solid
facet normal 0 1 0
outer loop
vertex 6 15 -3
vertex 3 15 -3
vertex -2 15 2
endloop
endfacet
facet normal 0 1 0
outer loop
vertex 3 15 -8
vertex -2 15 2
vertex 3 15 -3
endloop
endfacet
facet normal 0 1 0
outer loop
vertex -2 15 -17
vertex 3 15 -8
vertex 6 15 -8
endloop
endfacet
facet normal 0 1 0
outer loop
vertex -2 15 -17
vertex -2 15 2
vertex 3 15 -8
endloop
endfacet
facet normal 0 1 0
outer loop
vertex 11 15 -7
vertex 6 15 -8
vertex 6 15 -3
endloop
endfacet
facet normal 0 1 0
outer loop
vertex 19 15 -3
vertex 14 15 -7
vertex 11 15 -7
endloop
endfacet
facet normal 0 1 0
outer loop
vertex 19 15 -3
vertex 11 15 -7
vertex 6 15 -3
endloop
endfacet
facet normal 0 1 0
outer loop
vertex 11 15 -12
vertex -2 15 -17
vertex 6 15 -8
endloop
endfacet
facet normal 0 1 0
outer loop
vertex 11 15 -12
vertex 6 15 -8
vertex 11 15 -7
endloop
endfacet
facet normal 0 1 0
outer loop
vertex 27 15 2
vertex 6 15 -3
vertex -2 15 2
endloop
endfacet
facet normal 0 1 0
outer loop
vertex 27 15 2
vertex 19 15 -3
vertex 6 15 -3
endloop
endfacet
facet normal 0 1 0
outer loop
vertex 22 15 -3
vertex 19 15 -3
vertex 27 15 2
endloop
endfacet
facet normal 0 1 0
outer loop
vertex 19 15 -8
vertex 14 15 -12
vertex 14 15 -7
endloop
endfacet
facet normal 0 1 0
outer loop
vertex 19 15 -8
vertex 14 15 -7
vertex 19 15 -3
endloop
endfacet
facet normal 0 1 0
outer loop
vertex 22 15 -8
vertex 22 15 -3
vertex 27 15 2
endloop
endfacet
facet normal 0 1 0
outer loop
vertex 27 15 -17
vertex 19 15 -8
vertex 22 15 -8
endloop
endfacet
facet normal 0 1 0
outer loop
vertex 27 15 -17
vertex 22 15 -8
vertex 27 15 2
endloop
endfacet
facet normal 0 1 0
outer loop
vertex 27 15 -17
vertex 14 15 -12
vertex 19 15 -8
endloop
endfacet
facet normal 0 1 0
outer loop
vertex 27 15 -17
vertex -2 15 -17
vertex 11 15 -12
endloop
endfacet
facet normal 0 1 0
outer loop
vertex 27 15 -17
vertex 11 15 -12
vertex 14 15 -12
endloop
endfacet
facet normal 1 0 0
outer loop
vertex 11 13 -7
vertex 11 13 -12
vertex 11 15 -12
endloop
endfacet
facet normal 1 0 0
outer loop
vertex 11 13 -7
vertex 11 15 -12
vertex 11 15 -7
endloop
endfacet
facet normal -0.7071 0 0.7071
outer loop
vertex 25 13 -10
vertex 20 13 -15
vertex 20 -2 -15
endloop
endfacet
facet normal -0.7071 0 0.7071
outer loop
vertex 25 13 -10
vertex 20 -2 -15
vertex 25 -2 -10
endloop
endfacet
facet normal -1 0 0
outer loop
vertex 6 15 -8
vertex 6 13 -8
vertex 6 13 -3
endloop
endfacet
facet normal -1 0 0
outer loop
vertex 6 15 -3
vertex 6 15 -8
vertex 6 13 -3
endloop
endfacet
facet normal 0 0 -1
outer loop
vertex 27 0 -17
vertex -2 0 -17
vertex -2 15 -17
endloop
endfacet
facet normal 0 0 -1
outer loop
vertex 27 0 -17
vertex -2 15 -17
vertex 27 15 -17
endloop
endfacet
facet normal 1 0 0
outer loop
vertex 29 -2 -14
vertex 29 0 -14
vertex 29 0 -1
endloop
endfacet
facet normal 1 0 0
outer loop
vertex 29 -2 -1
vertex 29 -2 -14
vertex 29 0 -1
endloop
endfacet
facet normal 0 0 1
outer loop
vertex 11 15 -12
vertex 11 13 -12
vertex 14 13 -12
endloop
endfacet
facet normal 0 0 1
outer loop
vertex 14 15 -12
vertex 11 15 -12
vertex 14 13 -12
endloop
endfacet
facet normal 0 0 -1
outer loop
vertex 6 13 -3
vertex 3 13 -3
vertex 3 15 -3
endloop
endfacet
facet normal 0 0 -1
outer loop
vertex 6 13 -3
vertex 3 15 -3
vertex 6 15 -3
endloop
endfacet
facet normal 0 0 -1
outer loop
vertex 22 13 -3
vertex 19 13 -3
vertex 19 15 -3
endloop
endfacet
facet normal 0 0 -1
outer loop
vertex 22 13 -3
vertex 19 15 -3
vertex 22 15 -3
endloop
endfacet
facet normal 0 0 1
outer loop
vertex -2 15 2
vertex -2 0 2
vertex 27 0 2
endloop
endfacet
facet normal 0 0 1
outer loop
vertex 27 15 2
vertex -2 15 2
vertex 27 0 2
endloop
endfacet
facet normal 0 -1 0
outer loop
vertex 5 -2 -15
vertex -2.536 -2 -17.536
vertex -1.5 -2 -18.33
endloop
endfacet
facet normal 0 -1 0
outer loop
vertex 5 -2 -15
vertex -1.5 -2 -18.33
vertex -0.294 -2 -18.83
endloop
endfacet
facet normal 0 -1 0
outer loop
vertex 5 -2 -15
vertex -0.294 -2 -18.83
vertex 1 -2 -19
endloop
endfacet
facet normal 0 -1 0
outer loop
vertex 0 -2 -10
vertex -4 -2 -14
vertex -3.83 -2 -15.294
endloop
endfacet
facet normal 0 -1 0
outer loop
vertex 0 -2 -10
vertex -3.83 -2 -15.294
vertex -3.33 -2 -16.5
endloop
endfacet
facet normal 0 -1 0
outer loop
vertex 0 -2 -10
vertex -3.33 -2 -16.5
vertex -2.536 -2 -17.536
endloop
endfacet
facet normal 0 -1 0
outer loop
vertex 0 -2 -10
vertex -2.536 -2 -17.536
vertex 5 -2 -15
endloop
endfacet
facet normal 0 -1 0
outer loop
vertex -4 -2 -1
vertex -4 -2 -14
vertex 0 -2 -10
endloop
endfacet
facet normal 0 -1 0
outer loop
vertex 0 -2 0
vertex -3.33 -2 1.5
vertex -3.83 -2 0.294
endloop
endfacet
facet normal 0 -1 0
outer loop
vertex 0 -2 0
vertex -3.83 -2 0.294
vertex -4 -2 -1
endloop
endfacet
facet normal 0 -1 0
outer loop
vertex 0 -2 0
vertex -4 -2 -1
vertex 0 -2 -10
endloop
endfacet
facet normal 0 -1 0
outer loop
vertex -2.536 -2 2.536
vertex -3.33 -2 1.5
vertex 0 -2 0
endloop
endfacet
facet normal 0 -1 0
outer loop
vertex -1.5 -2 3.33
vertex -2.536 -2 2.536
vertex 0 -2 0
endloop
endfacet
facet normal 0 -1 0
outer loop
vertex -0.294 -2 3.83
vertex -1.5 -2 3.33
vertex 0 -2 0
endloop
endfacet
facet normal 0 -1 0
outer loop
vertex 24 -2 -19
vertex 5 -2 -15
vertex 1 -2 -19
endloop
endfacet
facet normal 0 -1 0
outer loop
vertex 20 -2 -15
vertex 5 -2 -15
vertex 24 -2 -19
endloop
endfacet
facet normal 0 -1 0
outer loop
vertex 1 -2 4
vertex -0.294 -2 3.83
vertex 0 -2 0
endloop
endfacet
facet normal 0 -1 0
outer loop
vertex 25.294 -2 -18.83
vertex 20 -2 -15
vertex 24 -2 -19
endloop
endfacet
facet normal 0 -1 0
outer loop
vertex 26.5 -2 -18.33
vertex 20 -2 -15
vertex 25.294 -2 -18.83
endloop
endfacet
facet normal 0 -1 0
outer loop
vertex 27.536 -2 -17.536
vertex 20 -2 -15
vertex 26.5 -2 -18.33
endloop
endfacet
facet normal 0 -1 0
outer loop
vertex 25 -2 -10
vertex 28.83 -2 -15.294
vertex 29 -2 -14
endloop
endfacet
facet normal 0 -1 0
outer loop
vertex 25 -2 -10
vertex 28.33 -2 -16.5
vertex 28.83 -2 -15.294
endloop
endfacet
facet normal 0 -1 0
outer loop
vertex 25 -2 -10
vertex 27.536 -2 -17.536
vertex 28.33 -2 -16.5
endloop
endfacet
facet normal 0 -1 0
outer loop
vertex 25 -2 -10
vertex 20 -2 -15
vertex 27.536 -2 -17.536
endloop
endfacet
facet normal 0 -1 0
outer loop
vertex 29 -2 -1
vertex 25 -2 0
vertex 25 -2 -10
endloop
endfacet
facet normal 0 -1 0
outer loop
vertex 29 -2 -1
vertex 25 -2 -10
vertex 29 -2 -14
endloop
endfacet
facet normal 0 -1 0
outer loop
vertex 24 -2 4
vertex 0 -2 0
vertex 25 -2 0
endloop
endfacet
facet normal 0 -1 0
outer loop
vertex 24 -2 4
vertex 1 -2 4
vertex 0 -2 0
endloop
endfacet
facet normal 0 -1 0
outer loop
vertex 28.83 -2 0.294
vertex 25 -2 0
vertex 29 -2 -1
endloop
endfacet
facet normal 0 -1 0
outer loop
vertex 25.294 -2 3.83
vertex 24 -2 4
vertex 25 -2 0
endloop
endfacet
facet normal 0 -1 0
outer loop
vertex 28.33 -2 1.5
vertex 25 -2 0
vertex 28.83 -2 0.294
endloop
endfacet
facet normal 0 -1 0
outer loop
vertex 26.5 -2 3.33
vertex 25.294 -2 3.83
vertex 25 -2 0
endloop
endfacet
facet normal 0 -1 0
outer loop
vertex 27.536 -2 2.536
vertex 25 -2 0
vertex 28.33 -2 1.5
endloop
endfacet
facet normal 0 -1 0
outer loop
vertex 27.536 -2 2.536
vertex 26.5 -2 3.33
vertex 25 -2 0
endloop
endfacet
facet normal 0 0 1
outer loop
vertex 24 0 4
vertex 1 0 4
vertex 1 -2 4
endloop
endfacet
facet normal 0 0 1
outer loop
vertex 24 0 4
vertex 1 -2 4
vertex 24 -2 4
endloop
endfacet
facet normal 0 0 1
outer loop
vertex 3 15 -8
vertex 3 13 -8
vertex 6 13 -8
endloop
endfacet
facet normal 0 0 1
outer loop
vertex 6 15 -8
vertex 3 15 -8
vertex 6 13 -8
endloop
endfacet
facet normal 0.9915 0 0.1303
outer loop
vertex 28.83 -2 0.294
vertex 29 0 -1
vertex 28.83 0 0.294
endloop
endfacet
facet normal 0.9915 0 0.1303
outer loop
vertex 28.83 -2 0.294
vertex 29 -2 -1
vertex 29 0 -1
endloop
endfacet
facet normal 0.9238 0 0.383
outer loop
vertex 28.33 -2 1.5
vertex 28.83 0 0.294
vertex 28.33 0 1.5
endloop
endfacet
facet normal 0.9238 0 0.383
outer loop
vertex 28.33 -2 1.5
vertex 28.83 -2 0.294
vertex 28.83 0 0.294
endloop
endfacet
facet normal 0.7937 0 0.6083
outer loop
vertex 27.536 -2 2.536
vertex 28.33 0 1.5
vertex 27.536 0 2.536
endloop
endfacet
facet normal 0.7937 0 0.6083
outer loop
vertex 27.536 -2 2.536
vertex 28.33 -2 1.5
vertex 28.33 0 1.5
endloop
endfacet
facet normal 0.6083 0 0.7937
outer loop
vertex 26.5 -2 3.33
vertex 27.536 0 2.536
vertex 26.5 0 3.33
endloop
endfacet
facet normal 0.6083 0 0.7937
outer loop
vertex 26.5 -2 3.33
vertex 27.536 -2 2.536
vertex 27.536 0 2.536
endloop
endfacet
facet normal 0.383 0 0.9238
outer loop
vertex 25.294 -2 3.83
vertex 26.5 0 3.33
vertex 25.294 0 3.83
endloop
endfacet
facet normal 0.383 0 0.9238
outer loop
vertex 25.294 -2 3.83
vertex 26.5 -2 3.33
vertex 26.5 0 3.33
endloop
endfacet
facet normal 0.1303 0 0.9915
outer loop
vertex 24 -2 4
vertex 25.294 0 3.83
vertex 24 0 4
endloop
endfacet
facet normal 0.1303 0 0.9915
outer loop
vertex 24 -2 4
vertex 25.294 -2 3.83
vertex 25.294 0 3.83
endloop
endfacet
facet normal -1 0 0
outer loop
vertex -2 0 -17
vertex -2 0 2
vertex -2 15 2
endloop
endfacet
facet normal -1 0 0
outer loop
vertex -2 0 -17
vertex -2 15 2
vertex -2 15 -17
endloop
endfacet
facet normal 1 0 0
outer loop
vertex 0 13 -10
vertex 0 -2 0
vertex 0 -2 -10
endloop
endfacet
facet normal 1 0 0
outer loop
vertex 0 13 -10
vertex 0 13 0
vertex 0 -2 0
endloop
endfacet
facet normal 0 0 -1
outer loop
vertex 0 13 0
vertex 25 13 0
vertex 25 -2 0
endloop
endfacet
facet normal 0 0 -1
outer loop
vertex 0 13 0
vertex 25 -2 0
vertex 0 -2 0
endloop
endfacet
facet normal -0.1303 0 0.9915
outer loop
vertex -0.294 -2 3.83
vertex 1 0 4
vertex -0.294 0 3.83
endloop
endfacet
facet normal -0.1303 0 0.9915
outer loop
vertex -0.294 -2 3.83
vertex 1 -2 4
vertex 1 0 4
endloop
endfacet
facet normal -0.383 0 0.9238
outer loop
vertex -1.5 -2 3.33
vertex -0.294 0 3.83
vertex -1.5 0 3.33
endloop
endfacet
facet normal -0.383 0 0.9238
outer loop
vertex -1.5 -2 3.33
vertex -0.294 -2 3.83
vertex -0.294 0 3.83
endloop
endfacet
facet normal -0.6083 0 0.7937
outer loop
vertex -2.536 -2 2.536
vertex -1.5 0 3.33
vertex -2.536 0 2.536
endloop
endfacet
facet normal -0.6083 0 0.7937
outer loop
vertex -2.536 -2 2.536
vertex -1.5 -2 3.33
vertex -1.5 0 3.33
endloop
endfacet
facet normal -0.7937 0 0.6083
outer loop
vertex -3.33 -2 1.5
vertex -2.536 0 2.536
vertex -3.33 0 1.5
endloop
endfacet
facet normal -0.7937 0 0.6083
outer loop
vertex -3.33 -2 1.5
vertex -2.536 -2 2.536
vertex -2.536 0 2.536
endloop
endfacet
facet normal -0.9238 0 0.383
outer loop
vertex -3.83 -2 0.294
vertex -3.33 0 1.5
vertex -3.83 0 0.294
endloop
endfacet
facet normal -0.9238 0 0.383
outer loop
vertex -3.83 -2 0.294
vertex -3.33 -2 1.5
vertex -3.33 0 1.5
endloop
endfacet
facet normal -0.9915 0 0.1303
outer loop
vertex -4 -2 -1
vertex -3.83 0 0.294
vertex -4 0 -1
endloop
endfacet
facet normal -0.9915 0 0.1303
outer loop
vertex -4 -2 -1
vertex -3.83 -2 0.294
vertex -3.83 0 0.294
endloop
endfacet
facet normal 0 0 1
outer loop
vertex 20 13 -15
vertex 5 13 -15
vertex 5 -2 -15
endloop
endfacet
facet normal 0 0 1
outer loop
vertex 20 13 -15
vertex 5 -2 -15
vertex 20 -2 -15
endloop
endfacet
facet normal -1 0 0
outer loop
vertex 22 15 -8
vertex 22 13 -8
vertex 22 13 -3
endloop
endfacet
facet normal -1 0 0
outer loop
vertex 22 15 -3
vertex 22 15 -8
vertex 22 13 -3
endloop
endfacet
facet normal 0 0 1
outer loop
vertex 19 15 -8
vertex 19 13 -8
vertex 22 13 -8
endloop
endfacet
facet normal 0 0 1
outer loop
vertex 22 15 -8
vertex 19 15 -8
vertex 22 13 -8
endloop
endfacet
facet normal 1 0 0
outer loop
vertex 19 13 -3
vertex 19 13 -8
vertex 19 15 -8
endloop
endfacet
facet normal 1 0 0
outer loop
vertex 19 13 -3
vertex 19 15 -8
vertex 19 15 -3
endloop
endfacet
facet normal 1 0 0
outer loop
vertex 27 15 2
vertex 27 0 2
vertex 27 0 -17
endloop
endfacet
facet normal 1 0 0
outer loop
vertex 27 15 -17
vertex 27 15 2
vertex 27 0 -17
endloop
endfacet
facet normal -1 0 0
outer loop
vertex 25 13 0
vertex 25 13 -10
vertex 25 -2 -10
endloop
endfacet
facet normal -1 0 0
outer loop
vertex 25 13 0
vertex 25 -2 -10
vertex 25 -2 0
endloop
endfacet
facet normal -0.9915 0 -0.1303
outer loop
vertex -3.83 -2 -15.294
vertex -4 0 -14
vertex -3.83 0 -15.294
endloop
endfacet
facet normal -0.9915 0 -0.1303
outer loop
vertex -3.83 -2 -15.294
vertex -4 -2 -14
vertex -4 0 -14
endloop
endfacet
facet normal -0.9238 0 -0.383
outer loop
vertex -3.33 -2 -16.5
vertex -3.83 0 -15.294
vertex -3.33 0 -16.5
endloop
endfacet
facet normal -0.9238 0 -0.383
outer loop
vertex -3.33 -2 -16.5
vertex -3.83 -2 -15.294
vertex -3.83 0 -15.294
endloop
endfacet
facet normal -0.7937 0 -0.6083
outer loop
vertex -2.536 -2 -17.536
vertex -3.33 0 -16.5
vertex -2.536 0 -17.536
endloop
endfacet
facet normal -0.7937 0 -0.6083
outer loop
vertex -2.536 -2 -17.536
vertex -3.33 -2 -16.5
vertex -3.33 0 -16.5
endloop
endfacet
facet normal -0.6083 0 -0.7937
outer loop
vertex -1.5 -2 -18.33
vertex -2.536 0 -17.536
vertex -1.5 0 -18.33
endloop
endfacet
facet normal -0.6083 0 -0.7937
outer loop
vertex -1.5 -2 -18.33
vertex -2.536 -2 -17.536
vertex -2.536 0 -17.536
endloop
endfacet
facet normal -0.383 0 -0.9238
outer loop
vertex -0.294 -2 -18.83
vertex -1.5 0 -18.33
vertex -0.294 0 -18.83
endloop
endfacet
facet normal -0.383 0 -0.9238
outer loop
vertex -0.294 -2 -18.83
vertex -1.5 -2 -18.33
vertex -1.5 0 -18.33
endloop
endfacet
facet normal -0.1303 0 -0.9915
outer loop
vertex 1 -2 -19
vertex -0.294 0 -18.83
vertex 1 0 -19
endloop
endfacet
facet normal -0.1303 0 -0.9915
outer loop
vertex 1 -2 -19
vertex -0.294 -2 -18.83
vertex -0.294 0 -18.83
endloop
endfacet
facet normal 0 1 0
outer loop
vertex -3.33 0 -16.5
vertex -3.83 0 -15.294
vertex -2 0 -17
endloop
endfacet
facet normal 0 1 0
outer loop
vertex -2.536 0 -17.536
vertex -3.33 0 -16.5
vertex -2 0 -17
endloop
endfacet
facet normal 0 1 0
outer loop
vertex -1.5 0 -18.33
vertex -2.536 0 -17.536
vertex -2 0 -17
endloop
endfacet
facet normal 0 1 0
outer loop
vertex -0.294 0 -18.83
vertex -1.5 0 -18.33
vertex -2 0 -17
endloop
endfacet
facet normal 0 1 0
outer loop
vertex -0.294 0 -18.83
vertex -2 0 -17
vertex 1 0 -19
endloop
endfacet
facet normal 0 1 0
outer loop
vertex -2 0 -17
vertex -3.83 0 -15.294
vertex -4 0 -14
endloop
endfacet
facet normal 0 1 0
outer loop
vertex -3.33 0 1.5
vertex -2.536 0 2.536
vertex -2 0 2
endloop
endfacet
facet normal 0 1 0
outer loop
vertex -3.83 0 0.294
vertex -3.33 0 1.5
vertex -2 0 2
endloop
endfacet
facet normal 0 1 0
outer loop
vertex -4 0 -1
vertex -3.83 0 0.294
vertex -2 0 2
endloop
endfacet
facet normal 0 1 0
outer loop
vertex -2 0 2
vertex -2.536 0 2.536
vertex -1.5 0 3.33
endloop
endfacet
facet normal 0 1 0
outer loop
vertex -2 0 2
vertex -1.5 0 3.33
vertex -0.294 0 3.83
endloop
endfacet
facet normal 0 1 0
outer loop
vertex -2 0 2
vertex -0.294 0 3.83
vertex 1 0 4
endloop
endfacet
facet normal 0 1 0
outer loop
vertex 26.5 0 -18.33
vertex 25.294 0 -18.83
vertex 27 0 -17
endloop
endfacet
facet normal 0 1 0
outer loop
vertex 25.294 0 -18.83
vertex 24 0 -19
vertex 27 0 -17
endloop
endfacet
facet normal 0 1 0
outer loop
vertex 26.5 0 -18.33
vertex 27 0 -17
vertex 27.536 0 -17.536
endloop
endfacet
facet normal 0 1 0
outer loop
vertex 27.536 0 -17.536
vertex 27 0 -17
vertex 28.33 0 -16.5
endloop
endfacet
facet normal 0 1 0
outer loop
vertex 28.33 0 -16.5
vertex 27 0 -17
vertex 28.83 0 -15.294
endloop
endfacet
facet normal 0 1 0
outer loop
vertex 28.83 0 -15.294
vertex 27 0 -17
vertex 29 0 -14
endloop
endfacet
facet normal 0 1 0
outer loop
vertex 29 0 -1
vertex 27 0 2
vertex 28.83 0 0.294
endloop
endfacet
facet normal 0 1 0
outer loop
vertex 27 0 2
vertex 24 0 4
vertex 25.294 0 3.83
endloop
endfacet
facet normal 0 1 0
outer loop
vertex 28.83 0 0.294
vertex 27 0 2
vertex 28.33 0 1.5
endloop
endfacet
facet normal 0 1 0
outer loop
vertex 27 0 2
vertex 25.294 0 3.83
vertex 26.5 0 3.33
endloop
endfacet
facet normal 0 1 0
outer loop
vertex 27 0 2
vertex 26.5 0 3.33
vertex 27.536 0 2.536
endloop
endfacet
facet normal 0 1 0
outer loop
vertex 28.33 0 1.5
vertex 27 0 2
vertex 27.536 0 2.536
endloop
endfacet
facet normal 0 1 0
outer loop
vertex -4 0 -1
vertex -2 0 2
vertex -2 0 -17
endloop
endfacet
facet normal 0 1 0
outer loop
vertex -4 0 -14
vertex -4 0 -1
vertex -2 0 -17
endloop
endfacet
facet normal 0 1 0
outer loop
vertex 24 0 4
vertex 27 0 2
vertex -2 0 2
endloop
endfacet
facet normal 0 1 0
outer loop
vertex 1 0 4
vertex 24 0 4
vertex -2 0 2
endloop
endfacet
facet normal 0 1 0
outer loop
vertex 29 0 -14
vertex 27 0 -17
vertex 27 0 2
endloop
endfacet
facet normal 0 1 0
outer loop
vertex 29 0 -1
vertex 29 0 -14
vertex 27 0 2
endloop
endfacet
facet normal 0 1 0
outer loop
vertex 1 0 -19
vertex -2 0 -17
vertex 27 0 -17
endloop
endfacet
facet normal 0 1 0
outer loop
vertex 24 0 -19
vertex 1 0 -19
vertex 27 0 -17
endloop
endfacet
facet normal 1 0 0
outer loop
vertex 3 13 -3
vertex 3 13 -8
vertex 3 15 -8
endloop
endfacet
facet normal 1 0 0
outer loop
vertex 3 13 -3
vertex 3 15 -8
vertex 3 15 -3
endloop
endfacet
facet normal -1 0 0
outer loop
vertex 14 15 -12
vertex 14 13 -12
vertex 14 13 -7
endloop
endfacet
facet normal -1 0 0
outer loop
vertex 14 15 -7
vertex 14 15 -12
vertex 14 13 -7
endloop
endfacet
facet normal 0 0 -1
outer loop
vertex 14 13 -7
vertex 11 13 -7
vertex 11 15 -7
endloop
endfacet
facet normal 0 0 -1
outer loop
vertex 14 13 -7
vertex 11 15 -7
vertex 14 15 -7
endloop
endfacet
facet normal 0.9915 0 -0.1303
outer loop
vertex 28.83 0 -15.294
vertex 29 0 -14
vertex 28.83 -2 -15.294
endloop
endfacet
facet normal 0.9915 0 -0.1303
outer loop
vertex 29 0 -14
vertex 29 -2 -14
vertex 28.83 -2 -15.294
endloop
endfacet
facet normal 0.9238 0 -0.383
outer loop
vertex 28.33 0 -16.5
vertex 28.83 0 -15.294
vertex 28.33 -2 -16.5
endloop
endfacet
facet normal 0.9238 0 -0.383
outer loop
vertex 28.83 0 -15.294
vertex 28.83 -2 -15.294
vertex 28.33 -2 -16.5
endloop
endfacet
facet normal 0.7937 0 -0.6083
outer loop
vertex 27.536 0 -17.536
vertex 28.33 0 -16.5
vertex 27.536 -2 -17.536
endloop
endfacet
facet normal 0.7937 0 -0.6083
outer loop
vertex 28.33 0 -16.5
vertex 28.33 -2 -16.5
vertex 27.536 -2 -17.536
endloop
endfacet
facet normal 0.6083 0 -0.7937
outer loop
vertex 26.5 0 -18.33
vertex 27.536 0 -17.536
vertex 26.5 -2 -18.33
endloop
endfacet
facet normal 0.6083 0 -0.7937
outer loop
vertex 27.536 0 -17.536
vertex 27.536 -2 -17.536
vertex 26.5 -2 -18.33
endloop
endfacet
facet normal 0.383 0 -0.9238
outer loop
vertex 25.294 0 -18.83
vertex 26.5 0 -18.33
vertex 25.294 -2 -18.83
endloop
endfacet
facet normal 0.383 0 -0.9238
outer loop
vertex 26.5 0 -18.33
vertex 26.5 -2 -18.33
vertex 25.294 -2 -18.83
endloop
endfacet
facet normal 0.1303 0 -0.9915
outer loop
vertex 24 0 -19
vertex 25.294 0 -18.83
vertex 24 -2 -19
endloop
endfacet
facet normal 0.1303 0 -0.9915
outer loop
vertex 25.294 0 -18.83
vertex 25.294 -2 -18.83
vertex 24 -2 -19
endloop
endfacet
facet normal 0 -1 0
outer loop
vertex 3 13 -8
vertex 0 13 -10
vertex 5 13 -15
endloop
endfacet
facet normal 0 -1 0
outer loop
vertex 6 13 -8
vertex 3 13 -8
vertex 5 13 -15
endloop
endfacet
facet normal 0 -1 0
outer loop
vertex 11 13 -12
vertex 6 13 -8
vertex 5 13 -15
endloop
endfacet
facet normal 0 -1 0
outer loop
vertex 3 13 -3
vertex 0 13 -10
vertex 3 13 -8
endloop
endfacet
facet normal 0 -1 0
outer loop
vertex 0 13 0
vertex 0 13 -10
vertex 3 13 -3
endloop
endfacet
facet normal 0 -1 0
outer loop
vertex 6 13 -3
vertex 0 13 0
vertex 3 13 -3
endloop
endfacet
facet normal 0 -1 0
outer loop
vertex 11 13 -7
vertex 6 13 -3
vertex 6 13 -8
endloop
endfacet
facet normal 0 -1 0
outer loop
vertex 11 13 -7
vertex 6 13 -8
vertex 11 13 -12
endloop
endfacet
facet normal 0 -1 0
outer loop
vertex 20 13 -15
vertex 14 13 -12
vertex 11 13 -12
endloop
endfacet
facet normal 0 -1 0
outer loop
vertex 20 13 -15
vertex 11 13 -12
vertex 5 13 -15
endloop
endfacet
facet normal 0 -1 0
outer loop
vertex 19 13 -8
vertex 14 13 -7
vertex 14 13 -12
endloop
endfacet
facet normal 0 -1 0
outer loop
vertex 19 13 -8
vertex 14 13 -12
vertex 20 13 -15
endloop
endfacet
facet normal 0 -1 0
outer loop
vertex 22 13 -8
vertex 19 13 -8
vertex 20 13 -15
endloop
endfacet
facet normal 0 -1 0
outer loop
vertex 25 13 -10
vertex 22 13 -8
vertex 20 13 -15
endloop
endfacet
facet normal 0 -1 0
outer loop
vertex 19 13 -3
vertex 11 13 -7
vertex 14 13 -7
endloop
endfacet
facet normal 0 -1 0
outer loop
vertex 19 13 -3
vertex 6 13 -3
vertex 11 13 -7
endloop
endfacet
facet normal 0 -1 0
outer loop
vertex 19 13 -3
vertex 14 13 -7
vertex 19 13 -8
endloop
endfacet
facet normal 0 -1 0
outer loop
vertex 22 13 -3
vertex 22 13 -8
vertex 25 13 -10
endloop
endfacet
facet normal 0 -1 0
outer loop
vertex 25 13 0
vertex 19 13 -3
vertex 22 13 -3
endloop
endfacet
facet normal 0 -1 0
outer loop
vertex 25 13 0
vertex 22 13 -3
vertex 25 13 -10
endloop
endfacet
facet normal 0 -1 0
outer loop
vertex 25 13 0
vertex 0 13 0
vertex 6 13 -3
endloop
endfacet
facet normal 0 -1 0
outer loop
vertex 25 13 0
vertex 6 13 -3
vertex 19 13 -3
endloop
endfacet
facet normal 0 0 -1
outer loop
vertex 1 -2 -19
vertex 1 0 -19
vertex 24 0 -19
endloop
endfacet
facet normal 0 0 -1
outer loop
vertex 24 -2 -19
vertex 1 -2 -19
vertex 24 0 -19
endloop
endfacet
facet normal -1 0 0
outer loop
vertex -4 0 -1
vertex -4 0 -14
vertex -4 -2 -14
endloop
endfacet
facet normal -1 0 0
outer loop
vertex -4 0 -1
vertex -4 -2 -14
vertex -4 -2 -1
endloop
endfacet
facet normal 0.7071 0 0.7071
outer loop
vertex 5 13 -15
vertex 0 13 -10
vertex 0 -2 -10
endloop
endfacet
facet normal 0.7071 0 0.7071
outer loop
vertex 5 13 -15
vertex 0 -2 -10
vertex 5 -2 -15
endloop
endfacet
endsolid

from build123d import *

# Parameters (mm, degrees)
SKETCH2_W           = 29
SKETCH2_H           = 19
BOSS_EXTRUDE1_DEPTH = 15
CUT_EXTRUDE1_DEPTH  = 13
SKETCH4_W           = 3
SKETCH4_H           = 5
CUT_EXTRUDE2_DEPTH  = 13
SKETCH5_W           = 33
SKETCH5_H           = 23
BOSS_EXTRUDE2_DEPTH = 2
FILLET1_R           = 5
FILLET2_R           = 5
FILLET3_R           = 5
FILLET4_R           = 5


with BuildPart() as part:
    # Sketch2 → Boss-Extrude1 (new body)
    with BuildSketch(Plane(origin=(0, 0, 0), x_dir=(1, 0, 0), z_dir=(0, 1, 0))):
        with Locations((12.5, 7.5)):
            Rectangle(SKETCH2_W, SKETCH2_H)
    extrude(amount=BOSS_EXTRUDE1_DEPTH)

    # Sketch3 → Cut-Extrude1 (cut)
    with BuildSketch(Plane.XZ):
        Polygon((0, 0), (0, -10), (5, -15), (20, -15), (25, -10), (25, 0), align=None)
    extrude(amount=-CUT_EXTRUDE1_DEPTH, mode=Mode.SUBTRACT)

    # Sketch4 → Cut-Extrude2 (cut)
    with BuildSketch(Plane.XZ.offset(-13)):
        with Locations((4.5, -5.5)):
            Rectangle(SKETCH4_W, SKETCH4_H)
        with Locations((12.5, -9.5)):
            Rectangle(SKETCH4_W, SKETCH4_H)
        with Locations((20.5, -5.5)):
            Rectangle(SKETCH4_W, SKETCH4_H)
    extrude(amount=-CUT_EXTRUDE2_DEPTH, mode=Mode.SUBTRACT)

    # Sketch5 → Boss-Extrude2 (add)
    with BuildSketch(Plane.XZ):
        with Locations((12.5, -7.5)):
            Rectangle(SKETCH5_W, SKETCH5_H)
        Polygon((0, 0), (0, -10), (5, -15), (20, -15), (25, -10), (25, 0), align=None, mode=Mode.SUBTRACT)
    extrude(amount=BOSS_EXTRUDE2_DEPTH)

    # Fillet1
    fillet1_edges = [part.edges().sort_by_distance(p)[0] for p in [
        (29, -1, -19),
    ]]
    fillet(fillet1_edges, radius=FILLET1_R)

    # Fillet2
    fillet2_edges = [part.edges().sort_by_distance(p)[0] for p in [
        (29, -1, 4),
    ]]
    fillet(fillet2_edges, radius=FILLET2_R)

    # Fillet3
    fillet3_edges = [part.edges().sort_by_distance(p)[0] for p in [
        (-4, -1, 4),
    ]]
    fillet(fillet3_edges, radius=FILLET3_R)

    # Fillet4
    fillet4_edges = [part.edges().sort_by_distance(p)[0] for p in [
        (-4, -1, -19),
    ]]
    fillet(fillet4_edges, radius=FILLET4_R)


solid = part.part
